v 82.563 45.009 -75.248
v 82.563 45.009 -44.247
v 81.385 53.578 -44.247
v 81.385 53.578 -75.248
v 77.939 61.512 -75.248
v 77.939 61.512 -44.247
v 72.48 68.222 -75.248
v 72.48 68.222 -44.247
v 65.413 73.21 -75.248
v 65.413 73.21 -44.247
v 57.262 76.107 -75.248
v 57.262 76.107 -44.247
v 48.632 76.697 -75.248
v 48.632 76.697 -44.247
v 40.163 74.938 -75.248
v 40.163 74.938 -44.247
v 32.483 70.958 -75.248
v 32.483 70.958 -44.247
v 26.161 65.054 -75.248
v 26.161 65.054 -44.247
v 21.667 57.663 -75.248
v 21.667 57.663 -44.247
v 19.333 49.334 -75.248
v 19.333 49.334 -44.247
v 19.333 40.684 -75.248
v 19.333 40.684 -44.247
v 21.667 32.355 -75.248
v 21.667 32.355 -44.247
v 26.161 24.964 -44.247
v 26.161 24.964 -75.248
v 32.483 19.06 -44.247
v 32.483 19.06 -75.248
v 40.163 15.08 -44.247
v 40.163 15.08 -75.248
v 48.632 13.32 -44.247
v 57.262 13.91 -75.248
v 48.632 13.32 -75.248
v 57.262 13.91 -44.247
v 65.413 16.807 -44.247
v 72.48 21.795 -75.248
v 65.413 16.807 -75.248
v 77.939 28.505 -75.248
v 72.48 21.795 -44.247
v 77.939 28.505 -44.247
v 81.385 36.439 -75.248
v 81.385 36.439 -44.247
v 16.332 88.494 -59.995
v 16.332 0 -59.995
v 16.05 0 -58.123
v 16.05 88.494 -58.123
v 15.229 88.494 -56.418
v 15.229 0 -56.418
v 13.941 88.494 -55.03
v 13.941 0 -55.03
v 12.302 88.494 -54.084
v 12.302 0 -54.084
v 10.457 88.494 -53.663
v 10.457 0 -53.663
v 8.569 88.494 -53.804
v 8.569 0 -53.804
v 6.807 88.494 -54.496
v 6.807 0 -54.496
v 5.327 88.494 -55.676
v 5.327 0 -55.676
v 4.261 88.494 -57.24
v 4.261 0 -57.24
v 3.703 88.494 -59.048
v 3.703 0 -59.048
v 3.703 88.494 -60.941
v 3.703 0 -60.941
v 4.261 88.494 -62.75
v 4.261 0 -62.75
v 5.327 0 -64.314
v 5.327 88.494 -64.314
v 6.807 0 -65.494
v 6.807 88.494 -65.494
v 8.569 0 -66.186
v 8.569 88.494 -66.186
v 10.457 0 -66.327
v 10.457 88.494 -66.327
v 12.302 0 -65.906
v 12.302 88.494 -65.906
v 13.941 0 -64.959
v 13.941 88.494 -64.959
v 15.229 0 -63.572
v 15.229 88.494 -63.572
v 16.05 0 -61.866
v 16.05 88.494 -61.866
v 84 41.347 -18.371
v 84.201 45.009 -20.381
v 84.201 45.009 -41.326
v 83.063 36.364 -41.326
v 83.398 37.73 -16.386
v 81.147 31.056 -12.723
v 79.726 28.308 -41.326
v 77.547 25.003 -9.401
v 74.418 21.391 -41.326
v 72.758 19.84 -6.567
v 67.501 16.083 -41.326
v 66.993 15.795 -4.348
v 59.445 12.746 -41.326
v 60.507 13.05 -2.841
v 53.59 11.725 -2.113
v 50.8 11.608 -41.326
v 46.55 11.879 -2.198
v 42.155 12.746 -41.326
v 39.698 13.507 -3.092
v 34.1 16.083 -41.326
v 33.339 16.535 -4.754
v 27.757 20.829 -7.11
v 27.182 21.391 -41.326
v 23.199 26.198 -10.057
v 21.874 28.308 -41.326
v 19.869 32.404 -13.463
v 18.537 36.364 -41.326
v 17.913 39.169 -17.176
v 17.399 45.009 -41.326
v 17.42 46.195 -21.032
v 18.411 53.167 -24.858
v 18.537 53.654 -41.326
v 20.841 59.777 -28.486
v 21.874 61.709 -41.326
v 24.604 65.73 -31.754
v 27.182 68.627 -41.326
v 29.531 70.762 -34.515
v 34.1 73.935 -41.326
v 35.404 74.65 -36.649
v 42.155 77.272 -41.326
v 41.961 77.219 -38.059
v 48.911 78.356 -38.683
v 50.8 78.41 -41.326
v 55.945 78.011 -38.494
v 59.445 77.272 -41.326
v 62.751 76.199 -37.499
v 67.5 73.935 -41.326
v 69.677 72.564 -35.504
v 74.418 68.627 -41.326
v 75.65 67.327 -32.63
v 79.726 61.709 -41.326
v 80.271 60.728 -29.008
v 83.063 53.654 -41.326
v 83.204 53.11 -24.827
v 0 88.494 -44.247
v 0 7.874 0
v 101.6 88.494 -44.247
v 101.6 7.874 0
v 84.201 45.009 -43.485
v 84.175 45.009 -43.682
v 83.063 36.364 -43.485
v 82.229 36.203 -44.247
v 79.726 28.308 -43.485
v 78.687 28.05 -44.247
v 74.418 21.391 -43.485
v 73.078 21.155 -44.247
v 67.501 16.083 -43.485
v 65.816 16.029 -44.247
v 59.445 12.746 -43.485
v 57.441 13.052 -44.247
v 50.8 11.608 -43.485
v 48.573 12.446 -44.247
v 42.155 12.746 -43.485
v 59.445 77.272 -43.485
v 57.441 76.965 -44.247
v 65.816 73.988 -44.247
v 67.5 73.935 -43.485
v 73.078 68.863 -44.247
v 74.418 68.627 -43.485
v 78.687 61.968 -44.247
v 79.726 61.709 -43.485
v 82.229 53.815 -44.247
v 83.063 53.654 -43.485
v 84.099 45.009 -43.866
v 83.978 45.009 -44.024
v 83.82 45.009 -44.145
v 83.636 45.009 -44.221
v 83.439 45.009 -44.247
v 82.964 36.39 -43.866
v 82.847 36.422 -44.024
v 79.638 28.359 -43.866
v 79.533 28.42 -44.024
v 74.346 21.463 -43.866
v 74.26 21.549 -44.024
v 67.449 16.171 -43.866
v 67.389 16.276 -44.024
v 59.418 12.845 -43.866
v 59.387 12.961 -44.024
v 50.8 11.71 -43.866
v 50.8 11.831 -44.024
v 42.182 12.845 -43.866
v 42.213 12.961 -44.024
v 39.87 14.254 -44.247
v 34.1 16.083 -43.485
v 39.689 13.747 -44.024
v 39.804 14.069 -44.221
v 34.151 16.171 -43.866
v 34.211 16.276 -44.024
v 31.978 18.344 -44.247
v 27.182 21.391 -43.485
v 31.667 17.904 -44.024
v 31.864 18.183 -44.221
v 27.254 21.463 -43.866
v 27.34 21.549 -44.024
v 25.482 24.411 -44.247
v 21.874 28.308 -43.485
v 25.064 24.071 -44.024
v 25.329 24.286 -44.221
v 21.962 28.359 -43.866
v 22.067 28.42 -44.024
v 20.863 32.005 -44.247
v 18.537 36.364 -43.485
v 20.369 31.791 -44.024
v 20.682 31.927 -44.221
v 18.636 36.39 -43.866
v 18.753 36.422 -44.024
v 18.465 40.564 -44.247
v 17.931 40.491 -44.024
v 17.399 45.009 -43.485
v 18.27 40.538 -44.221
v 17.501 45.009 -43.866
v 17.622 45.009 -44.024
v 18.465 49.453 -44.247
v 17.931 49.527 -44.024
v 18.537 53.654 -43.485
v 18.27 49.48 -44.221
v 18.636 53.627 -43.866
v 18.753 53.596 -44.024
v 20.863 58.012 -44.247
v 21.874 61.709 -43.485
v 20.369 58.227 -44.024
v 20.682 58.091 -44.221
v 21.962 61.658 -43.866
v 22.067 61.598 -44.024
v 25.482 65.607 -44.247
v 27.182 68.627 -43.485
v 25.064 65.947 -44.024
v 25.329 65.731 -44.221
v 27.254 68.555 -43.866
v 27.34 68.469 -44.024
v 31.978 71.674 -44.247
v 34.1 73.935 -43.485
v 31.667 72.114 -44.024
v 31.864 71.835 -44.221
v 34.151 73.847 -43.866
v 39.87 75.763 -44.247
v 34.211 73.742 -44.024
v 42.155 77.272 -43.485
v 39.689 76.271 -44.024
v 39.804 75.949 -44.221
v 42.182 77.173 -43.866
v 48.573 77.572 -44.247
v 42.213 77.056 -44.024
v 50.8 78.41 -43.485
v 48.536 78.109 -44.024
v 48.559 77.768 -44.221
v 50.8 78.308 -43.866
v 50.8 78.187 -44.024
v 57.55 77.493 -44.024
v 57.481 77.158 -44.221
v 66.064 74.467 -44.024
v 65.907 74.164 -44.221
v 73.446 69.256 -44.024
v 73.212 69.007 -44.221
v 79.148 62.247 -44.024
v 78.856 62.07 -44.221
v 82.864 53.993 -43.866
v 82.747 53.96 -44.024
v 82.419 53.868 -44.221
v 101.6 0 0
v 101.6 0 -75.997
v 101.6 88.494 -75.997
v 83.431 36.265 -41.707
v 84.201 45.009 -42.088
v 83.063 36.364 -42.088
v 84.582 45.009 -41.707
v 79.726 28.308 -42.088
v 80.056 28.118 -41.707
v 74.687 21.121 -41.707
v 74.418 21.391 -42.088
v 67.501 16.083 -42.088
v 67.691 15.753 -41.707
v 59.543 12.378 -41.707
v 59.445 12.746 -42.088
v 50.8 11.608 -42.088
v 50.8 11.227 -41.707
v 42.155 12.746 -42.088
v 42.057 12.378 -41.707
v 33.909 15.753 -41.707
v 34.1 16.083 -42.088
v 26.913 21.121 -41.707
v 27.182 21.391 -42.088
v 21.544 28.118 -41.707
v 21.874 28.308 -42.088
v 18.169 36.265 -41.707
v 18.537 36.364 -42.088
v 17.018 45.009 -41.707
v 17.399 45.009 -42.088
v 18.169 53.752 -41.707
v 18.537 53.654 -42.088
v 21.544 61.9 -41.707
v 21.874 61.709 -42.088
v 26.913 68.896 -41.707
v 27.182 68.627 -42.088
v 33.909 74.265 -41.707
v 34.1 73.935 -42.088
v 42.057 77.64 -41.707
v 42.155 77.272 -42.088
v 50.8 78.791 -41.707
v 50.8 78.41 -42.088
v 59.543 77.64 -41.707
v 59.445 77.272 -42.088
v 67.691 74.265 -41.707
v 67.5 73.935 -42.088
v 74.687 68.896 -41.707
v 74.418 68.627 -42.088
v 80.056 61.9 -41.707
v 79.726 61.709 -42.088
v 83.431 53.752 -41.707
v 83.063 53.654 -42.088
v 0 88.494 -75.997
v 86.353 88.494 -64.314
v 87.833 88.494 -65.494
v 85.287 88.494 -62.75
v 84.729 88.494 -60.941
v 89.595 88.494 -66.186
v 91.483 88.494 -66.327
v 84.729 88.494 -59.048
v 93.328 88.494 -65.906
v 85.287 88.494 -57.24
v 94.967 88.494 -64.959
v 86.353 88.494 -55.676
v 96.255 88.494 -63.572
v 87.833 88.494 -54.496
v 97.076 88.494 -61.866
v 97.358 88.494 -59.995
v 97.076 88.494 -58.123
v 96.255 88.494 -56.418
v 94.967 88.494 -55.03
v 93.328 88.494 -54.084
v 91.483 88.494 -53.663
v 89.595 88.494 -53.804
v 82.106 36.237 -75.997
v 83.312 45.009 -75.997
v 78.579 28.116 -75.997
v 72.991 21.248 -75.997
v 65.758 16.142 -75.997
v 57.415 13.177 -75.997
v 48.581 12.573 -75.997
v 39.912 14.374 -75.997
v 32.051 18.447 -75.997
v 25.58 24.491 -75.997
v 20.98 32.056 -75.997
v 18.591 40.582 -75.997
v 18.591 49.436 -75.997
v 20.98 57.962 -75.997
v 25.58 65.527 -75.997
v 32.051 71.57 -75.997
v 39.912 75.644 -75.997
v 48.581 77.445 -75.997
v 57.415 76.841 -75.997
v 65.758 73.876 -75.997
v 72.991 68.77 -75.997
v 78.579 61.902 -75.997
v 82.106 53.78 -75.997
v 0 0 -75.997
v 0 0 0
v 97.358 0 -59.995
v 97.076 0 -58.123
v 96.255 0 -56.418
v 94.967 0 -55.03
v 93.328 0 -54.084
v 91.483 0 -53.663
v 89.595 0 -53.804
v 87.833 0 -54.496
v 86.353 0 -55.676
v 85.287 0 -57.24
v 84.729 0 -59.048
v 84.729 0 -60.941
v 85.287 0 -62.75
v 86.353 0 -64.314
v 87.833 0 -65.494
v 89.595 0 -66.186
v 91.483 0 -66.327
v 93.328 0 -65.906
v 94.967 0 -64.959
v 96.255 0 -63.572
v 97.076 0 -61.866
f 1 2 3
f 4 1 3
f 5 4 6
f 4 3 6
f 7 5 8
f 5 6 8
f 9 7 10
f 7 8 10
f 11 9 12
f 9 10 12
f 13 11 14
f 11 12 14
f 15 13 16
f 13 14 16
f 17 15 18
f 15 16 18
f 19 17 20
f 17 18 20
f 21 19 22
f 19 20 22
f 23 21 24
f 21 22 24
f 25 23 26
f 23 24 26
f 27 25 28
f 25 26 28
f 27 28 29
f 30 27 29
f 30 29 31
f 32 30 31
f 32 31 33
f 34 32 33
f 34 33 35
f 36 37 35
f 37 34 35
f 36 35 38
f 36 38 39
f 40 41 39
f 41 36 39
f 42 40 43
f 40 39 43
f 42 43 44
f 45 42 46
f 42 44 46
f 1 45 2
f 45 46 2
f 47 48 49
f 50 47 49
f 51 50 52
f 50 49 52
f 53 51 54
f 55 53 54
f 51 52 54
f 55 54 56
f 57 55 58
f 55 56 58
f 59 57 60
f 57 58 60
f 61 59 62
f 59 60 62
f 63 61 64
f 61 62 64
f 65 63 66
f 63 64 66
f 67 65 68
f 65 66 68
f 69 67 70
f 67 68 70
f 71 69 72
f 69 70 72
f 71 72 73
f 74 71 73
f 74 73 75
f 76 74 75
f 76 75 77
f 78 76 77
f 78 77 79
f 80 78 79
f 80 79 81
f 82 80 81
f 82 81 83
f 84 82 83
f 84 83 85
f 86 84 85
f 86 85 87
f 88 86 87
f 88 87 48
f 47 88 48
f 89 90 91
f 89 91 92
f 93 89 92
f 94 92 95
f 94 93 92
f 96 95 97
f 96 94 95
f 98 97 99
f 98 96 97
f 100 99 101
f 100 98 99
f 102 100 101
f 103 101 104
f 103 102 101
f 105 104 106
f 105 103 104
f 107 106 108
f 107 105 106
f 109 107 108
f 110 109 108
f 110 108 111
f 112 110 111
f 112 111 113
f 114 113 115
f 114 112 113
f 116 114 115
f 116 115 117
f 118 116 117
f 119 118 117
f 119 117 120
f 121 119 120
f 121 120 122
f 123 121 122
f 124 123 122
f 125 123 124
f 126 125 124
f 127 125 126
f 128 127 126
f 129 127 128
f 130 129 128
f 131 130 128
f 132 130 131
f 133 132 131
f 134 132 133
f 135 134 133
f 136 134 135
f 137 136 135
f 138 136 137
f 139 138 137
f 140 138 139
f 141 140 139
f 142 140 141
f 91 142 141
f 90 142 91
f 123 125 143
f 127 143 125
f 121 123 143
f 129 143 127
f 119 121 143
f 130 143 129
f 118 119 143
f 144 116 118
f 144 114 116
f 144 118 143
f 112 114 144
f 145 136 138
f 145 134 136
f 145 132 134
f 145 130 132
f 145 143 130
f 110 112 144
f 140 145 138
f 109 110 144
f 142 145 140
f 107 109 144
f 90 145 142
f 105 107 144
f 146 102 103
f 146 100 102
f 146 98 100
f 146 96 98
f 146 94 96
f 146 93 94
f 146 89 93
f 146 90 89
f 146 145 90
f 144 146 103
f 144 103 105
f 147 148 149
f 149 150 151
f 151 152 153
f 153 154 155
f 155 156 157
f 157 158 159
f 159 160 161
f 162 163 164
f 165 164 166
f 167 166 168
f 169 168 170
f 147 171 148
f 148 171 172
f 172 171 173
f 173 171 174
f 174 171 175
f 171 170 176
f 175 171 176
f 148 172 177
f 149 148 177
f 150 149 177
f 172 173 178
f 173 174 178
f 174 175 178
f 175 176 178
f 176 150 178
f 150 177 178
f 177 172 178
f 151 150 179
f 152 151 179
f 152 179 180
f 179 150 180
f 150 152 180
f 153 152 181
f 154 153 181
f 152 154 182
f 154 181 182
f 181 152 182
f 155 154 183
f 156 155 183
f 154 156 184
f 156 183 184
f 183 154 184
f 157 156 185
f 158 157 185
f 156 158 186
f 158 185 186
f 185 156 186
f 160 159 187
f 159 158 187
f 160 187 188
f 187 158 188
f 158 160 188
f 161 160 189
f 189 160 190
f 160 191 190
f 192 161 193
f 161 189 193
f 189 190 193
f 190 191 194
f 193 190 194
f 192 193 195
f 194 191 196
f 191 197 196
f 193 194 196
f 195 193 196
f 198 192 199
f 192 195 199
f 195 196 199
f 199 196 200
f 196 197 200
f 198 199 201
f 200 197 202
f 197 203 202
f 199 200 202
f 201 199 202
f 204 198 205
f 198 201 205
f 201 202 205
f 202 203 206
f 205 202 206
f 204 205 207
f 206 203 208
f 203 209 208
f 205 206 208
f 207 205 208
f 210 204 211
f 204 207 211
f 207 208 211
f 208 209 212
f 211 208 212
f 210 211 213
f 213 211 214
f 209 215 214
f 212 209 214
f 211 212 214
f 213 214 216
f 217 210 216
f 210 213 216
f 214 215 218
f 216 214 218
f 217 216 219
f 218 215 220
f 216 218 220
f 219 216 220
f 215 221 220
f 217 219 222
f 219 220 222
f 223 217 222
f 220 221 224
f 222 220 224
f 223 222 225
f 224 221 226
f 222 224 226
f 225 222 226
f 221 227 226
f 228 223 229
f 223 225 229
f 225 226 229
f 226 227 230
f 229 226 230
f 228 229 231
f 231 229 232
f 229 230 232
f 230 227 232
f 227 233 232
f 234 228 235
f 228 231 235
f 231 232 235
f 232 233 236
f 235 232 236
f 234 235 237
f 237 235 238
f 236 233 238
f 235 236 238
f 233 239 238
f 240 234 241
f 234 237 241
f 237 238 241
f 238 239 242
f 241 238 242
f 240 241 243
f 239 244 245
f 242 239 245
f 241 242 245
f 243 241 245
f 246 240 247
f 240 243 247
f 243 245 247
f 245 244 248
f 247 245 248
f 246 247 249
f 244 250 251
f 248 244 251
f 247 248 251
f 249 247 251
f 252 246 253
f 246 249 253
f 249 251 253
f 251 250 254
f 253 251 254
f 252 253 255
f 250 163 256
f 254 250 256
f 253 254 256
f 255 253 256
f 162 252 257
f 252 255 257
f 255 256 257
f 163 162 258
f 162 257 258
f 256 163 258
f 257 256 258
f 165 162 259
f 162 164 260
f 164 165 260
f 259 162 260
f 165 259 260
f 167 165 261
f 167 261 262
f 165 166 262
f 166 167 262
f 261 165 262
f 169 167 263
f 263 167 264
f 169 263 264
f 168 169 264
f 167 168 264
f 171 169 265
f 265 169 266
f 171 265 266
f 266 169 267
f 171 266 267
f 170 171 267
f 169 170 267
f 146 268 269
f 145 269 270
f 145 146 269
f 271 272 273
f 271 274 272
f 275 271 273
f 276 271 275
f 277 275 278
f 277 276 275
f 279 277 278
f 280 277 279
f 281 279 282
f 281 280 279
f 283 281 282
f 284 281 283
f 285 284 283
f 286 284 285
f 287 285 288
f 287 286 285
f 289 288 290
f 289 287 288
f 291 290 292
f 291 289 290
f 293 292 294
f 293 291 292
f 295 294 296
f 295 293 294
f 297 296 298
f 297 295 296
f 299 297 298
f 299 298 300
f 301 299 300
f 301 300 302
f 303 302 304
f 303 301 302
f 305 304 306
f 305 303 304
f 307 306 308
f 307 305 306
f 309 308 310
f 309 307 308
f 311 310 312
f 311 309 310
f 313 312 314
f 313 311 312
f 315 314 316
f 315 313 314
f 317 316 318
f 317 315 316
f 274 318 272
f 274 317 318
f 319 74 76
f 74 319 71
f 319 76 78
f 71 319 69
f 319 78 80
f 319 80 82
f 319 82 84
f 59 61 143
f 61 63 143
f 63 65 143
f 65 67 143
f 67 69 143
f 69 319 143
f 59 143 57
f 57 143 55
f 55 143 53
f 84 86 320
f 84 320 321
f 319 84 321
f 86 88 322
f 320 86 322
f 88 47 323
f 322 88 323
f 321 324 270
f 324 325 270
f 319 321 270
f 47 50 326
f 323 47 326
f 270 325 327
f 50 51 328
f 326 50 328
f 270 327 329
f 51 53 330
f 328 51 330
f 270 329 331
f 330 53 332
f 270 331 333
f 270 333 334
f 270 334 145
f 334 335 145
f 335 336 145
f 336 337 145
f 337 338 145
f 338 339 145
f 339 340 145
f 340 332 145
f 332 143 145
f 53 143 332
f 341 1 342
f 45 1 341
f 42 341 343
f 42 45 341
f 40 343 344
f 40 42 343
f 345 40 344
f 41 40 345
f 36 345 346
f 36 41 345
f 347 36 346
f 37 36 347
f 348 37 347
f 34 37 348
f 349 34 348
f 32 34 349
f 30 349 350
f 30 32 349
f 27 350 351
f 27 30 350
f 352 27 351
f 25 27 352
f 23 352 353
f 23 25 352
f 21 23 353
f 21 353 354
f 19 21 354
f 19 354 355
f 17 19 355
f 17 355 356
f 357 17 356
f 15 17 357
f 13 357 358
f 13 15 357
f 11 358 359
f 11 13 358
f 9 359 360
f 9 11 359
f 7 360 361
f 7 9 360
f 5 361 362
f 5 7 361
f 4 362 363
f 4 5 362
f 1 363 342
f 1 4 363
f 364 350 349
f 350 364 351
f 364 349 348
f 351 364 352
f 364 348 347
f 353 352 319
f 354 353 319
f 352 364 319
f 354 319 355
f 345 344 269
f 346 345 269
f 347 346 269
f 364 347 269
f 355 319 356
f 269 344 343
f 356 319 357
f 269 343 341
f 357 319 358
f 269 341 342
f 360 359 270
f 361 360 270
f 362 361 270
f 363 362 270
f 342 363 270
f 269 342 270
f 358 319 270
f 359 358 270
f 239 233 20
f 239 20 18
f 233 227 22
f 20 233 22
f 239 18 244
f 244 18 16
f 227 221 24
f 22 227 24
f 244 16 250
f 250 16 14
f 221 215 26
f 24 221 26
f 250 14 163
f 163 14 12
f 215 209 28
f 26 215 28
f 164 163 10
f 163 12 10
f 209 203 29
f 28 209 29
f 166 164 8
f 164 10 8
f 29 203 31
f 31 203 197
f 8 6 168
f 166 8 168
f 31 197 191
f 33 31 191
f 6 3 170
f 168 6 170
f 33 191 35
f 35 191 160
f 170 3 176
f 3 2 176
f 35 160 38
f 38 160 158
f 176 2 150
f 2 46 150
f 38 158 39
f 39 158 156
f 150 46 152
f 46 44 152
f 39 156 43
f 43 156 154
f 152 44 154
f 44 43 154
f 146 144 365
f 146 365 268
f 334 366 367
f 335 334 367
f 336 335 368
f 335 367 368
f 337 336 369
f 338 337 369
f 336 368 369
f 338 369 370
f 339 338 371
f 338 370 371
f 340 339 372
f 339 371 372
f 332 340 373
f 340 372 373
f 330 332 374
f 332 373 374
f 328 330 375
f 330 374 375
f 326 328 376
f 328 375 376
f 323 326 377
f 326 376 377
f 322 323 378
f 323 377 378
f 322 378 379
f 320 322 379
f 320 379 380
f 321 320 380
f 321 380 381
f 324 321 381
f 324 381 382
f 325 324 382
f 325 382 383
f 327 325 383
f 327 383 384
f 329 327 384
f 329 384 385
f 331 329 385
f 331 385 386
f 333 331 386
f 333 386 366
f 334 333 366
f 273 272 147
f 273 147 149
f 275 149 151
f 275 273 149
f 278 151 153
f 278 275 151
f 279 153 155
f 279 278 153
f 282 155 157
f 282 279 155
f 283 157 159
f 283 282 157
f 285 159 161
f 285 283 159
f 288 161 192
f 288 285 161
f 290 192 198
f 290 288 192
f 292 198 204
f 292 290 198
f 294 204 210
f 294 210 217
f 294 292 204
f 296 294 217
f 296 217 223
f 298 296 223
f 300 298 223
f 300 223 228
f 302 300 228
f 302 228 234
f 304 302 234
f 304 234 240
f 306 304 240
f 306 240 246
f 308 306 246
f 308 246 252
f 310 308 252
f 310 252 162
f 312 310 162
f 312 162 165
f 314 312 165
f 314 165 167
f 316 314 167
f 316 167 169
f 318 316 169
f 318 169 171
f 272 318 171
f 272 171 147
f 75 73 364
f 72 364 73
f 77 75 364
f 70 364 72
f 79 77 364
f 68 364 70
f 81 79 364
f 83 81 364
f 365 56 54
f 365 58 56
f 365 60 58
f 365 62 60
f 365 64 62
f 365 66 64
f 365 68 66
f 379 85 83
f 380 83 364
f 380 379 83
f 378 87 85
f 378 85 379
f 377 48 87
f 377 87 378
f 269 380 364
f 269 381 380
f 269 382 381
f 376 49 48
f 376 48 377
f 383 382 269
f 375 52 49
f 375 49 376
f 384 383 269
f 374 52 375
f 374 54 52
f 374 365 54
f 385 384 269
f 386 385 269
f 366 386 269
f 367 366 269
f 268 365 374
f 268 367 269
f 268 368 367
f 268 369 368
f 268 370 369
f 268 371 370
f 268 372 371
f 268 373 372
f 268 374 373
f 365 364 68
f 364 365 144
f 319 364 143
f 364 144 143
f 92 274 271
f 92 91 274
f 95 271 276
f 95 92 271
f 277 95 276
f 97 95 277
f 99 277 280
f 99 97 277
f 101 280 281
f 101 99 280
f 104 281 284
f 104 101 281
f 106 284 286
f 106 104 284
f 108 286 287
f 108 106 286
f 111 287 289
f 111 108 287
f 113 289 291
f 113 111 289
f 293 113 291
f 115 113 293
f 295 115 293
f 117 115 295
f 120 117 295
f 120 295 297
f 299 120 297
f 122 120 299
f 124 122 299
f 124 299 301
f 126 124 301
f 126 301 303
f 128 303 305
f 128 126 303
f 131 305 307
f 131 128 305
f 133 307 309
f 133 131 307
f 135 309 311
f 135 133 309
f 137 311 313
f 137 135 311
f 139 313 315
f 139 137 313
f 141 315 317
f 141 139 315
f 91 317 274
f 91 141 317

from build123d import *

# Parameters (mm, degrees)
SKETCH1_W          = 101.6
SKETCH1_H          = 88.4936
SKETCH1_R          = 31.7627
EXTRUDE1_DEPTH     = 75.9968
CUT_EXTRUDE1_DEPTH = 102.6
SKETCH3_R          = 33.401
CUT_EXTRUDE2_DEPTH = 44.2468
FILLET1_R          = 0.762
HOLE1_D            = 12.7
HOLE1_DEPTH        = 88.4936


with BuildPart() as part:
    # Sketch1 → Extrude1 (new body)
    with BuildSketch(Plane.XY):
        with Locations((50.8, 44.2468)):
            Rectangle(SKETCH1_W, SKETCH1_H)
        with Locations((50.8, 45.0088)):
            Circle(SKETCH1_R, mode=Mode.SUBTRACT)
    extrude(amount=-EXTRUDE1_DEPTH)

    # Sketch2 → Cut-Extrude1 (cut, through all)
    with BuildSketch(Plane(origin=(101.6, 0, 0), x_dir=(0, 0, -1), z_dir=(1, 0, 0))):
        Polygon((0, 88.4936), (44.2468, 88.4936), (0, 7.874), align=None)
    extrude(amount=-CUT_EXTRUDE1_DEPTH, mode=Mode.SUBTRACT)

    # Sketch3 → Cut-Extrude2 (cut)
    with BuildSketch(Plane(origin=(0, 0, 0), x_dir=(-1, 0, 0), z_dir=(0, 0, -1))):
        with Locations(Location((-50.8, 45.0088, 0), (0, 0, 180))):  # turned: the seam where the file's is
            Circle(SKETCH3_R)
    extrude(amount=CUT_EXTRUDE2_DEPTH, mode=Mode.SUBTRACT)

    # Fillet1
    fillet1_edges = [part.edges().sort_by_distance(p)[0] for p in [
        (17.399, 45.0088, -44.2468),
    ]]
    fillet(fillet1_edges, radius=FILLET1_R)

    # Hole1
    with Locations(Plane(origin=(0, 88.4936, 0), x_dir=(-1, 0, 0), z_dir=(0, 1, 0))):
        with Locations((-9.9822, -59.9948), (-91.0082, -59.9948)):
            Hole(HOLE1_D / 2, depth=HOLE1_DEPTH)

    # Sketch6 → Cut-Revolve1 (revolve, cut)
    with BuildSketch(Plane(origin=(0, 45.0088, 0), x_dir=(-1, 0, 0), z_dir=(0, 1, 0)), mode=Mode.PRIVATE) as cut_revolve1_sk:
        Polygon((-17.399, -41.3258), (-17.399, -42.0878), (-17.018, -41.7068), align=None)
        Polygon((-19.0373, -75.2475), (-19.0373, -75.9968), (-18.288, -75.9968), align=None)
    revolve(cut_revolve1_sk.sketch.rotate(Axis((50.8, 45.0088, 17.508123997), (0, 0, -1)), 180), axis=Axis((50.8, 45.0088, 17.508123997), (0, 0, -1)), mode=Mode.SUBTRACT)  # turned: the seam where the file's is


solid = part.part
